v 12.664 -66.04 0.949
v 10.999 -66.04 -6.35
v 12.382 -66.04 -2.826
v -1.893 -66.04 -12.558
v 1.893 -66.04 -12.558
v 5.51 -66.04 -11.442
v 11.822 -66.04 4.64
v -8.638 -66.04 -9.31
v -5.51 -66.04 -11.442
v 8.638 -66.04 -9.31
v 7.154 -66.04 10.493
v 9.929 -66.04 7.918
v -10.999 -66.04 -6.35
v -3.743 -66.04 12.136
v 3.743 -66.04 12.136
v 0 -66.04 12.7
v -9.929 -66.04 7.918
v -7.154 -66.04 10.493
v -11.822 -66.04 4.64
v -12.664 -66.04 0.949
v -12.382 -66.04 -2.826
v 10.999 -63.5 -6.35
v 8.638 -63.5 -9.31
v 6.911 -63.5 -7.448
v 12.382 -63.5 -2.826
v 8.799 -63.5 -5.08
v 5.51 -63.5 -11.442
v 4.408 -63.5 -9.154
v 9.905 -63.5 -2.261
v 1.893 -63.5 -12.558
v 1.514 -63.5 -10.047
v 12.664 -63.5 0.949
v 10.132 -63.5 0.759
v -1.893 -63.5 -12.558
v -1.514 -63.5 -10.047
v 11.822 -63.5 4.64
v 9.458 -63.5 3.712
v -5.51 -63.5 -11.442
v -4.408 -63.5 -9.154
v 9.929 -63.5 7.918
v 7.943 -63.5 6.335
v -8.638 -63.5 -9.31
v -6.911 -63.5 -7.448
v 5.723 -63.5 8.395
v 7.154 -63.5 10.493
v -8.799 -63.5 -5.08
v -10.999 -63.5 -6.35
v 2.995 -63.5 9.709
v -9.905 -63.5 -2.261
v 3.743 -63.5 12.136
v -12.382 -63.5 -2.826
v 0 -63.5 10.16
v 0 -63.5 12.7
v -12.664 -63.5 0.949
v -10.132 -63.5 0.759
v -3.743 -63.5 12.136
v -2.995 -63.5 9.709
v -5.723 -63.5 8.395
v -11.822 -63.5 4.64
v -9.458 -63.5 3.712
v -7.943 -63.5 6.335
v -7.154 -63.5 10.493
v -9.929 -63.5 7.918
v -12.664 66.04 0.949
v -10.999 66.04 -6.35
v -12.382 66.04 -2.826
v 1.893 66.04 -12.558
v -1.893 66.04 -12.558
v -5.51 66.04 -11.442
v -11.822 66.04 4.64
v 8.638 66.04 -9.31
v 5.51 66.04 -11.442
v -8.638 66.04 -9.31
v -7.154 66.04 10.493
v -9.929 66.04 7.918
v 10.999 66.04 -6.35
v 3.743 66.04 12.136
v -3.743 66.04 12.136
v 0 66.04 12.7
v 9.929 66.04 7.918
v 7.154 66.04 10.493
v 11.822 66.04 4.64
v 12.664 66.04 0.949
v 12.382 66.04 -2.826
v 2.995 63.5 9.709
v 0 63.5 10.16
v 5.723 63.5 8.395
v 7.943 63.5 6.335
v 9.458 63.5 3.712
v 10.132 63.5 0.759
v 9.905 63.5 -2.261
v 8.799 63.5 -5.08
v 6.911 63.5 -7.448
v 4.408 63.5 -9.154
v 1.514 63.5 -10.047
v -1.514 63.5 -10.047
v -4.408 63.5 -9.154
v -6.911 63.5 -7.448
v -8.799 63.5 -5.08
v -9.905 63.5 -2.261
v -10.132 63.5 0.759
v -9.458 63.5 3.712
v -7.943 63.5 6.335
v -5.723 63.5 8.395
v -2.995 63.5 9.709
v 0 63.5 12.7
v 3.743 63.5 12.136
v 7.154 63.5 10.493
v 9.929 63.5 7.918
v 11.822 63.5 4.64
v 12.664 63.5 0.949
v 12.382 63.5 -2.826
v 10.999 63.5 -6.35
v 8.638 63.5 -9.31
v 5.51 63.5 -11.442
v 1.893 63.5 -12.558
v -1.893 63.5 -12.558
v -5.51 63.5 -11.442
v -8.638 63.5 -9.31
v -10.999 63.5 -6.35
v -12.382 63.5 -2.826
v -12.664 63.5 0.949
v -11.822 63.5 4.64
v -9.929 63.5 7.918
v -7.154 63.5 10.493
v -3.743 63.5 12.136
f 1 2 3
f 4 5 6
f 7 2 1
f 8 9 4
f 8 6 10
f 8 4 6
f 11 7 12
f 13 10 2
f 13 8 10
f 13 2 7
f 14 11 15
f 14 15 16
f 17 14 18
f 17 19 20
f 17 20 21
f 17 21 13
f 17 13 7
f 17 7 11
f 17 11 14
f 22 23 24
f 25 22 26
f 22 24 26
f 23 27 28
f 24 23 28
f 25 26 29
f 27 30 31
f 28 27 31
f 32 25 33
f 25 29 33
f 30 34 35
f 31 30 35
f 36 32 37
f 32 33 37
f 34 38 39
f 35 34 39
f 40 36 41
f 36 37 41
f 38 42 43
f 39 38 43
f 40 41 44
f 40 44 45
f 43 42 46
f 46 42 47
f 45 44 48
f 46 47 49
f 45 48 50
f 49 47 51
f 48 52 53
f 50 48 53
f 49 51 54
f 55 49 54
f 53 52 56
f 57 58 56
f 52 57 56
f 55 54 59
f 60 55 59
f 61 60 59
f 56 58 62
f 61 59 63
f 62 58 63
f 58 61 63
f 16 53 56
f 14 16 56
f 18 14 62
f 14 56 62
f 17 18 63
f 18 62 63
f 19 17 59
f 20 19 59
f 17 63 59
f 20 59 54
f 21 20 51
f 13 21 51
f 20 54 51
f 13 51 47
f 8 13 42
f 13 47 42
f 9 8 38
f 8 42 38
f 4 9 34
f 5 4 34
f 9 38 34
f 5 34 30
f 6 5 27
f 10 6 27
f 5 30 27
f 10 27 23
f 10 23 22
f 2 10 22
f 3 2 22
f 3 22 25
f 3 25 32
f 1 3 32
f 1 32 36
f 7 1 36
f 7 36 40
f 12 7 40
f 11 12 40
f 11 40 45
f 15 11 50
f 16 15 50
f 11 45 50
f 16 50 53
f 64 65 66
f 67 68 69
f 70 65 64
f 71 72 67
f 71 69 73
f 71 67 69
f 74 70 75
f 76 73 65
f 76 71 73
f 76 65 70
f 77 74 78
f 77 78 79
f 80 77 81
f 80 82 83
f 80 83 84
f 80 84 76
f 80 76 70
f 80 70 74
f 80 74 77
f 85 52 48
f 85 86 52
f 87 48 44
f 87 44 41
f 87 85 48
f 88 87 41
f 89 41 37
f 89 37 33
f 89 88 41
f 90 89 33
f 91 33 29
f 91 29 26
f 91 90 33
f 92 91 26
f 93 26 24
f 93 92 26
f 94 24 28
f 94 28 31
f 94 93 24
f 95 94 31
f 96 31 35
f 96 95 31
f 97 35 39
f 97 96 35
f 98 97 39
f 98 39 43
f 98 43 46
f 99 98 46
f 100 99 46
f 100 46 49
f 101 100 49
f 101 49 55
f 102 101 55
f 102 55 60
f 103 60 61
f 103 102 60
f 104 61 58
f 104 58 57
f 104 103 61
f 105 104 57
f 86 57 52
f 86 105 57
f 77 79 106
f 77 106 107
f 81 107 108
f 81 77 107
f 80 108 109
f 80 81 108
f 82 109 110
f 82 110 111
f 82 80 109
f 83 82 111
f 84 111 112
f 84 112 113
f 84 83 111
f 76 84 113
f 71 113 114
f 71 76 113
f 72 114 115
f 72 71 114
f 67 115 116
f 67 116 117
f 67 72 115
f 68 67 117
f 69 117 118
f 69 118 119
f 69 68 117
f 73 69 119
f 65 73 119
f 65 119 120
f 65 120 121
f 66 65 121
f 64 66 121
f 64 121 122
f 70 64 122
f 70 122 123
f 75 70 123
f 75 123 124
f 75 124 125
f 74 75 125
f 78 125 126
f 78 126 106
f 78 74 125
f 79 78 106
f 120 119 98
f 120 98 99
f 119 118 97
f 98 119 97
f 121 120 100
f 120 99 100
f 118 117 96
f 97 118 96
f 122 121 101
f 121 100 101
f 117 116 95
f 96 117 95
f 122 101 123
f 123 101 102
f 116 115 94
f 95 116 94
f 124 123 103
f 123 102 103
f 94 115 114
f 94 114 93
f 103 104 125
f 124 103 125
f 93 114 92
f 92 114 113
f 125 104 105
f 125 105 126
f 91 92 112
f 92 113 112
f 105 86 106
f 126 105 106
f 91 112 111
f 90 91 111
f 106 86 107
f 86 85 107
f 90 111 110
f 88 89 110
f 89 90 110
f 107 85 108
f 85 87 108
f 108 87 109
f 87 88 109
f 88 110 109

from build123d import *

# Parameters (mm, degrees)
SKETCH1_R           = 10.16
BOSS_EXTRUDE1_DEPTH = 66.04
SKETCH2_R           = 12.7
BOSS_EXTRUDE2_DEPTH = 2.54
BOSS_EXTRUDE3_START = -2.54
SKETCH3_R           = 12.7
BOSS_EXTRUDE3_DEPTH = 2.54


with BuildPart() as part:
    # Sketch1 → Boss-Extrude1 (new, symmetric)
    with BuildSketch(Plane(origin=(0, 0, 0), x_dir=(1, 0, 0), z_dir=(0, 1, 0))):
        with Locations(Location((0, 0, 0), (0, 0, 270))):
            Circle(SKETCH1_R)
    extrude(amount=BOSS_EXTRUDE1_DEPTH, both=True)

    # Sketch2 → Boss-Extrude2 (add)
    with BuildSketch(Plane(origin=(0, 66.04, 0), x_dir=(1, 0, 0), z_dir=(0, 1, 0))):
        with Locations(Location((0, 0, 0), (0, 0, 270))):
            Circle(SKETCH2_R)
    extrude(amount=-BOSS_EXTRUDE2_DEPTH)

    # Sketch3 → Boss-Extrude3 (add)
    with BuildSketch(Plane.XZ.offset(66.04).offset(BOSS_EXTRUDE3_START)):
        with Locations(Location((0, 0, 0), (0, 0, 90))):
            Circle(SKETCH3_R)
    extrude(amount=BOSS_EXTRUDE3_DEPTH)


solid = part.part
